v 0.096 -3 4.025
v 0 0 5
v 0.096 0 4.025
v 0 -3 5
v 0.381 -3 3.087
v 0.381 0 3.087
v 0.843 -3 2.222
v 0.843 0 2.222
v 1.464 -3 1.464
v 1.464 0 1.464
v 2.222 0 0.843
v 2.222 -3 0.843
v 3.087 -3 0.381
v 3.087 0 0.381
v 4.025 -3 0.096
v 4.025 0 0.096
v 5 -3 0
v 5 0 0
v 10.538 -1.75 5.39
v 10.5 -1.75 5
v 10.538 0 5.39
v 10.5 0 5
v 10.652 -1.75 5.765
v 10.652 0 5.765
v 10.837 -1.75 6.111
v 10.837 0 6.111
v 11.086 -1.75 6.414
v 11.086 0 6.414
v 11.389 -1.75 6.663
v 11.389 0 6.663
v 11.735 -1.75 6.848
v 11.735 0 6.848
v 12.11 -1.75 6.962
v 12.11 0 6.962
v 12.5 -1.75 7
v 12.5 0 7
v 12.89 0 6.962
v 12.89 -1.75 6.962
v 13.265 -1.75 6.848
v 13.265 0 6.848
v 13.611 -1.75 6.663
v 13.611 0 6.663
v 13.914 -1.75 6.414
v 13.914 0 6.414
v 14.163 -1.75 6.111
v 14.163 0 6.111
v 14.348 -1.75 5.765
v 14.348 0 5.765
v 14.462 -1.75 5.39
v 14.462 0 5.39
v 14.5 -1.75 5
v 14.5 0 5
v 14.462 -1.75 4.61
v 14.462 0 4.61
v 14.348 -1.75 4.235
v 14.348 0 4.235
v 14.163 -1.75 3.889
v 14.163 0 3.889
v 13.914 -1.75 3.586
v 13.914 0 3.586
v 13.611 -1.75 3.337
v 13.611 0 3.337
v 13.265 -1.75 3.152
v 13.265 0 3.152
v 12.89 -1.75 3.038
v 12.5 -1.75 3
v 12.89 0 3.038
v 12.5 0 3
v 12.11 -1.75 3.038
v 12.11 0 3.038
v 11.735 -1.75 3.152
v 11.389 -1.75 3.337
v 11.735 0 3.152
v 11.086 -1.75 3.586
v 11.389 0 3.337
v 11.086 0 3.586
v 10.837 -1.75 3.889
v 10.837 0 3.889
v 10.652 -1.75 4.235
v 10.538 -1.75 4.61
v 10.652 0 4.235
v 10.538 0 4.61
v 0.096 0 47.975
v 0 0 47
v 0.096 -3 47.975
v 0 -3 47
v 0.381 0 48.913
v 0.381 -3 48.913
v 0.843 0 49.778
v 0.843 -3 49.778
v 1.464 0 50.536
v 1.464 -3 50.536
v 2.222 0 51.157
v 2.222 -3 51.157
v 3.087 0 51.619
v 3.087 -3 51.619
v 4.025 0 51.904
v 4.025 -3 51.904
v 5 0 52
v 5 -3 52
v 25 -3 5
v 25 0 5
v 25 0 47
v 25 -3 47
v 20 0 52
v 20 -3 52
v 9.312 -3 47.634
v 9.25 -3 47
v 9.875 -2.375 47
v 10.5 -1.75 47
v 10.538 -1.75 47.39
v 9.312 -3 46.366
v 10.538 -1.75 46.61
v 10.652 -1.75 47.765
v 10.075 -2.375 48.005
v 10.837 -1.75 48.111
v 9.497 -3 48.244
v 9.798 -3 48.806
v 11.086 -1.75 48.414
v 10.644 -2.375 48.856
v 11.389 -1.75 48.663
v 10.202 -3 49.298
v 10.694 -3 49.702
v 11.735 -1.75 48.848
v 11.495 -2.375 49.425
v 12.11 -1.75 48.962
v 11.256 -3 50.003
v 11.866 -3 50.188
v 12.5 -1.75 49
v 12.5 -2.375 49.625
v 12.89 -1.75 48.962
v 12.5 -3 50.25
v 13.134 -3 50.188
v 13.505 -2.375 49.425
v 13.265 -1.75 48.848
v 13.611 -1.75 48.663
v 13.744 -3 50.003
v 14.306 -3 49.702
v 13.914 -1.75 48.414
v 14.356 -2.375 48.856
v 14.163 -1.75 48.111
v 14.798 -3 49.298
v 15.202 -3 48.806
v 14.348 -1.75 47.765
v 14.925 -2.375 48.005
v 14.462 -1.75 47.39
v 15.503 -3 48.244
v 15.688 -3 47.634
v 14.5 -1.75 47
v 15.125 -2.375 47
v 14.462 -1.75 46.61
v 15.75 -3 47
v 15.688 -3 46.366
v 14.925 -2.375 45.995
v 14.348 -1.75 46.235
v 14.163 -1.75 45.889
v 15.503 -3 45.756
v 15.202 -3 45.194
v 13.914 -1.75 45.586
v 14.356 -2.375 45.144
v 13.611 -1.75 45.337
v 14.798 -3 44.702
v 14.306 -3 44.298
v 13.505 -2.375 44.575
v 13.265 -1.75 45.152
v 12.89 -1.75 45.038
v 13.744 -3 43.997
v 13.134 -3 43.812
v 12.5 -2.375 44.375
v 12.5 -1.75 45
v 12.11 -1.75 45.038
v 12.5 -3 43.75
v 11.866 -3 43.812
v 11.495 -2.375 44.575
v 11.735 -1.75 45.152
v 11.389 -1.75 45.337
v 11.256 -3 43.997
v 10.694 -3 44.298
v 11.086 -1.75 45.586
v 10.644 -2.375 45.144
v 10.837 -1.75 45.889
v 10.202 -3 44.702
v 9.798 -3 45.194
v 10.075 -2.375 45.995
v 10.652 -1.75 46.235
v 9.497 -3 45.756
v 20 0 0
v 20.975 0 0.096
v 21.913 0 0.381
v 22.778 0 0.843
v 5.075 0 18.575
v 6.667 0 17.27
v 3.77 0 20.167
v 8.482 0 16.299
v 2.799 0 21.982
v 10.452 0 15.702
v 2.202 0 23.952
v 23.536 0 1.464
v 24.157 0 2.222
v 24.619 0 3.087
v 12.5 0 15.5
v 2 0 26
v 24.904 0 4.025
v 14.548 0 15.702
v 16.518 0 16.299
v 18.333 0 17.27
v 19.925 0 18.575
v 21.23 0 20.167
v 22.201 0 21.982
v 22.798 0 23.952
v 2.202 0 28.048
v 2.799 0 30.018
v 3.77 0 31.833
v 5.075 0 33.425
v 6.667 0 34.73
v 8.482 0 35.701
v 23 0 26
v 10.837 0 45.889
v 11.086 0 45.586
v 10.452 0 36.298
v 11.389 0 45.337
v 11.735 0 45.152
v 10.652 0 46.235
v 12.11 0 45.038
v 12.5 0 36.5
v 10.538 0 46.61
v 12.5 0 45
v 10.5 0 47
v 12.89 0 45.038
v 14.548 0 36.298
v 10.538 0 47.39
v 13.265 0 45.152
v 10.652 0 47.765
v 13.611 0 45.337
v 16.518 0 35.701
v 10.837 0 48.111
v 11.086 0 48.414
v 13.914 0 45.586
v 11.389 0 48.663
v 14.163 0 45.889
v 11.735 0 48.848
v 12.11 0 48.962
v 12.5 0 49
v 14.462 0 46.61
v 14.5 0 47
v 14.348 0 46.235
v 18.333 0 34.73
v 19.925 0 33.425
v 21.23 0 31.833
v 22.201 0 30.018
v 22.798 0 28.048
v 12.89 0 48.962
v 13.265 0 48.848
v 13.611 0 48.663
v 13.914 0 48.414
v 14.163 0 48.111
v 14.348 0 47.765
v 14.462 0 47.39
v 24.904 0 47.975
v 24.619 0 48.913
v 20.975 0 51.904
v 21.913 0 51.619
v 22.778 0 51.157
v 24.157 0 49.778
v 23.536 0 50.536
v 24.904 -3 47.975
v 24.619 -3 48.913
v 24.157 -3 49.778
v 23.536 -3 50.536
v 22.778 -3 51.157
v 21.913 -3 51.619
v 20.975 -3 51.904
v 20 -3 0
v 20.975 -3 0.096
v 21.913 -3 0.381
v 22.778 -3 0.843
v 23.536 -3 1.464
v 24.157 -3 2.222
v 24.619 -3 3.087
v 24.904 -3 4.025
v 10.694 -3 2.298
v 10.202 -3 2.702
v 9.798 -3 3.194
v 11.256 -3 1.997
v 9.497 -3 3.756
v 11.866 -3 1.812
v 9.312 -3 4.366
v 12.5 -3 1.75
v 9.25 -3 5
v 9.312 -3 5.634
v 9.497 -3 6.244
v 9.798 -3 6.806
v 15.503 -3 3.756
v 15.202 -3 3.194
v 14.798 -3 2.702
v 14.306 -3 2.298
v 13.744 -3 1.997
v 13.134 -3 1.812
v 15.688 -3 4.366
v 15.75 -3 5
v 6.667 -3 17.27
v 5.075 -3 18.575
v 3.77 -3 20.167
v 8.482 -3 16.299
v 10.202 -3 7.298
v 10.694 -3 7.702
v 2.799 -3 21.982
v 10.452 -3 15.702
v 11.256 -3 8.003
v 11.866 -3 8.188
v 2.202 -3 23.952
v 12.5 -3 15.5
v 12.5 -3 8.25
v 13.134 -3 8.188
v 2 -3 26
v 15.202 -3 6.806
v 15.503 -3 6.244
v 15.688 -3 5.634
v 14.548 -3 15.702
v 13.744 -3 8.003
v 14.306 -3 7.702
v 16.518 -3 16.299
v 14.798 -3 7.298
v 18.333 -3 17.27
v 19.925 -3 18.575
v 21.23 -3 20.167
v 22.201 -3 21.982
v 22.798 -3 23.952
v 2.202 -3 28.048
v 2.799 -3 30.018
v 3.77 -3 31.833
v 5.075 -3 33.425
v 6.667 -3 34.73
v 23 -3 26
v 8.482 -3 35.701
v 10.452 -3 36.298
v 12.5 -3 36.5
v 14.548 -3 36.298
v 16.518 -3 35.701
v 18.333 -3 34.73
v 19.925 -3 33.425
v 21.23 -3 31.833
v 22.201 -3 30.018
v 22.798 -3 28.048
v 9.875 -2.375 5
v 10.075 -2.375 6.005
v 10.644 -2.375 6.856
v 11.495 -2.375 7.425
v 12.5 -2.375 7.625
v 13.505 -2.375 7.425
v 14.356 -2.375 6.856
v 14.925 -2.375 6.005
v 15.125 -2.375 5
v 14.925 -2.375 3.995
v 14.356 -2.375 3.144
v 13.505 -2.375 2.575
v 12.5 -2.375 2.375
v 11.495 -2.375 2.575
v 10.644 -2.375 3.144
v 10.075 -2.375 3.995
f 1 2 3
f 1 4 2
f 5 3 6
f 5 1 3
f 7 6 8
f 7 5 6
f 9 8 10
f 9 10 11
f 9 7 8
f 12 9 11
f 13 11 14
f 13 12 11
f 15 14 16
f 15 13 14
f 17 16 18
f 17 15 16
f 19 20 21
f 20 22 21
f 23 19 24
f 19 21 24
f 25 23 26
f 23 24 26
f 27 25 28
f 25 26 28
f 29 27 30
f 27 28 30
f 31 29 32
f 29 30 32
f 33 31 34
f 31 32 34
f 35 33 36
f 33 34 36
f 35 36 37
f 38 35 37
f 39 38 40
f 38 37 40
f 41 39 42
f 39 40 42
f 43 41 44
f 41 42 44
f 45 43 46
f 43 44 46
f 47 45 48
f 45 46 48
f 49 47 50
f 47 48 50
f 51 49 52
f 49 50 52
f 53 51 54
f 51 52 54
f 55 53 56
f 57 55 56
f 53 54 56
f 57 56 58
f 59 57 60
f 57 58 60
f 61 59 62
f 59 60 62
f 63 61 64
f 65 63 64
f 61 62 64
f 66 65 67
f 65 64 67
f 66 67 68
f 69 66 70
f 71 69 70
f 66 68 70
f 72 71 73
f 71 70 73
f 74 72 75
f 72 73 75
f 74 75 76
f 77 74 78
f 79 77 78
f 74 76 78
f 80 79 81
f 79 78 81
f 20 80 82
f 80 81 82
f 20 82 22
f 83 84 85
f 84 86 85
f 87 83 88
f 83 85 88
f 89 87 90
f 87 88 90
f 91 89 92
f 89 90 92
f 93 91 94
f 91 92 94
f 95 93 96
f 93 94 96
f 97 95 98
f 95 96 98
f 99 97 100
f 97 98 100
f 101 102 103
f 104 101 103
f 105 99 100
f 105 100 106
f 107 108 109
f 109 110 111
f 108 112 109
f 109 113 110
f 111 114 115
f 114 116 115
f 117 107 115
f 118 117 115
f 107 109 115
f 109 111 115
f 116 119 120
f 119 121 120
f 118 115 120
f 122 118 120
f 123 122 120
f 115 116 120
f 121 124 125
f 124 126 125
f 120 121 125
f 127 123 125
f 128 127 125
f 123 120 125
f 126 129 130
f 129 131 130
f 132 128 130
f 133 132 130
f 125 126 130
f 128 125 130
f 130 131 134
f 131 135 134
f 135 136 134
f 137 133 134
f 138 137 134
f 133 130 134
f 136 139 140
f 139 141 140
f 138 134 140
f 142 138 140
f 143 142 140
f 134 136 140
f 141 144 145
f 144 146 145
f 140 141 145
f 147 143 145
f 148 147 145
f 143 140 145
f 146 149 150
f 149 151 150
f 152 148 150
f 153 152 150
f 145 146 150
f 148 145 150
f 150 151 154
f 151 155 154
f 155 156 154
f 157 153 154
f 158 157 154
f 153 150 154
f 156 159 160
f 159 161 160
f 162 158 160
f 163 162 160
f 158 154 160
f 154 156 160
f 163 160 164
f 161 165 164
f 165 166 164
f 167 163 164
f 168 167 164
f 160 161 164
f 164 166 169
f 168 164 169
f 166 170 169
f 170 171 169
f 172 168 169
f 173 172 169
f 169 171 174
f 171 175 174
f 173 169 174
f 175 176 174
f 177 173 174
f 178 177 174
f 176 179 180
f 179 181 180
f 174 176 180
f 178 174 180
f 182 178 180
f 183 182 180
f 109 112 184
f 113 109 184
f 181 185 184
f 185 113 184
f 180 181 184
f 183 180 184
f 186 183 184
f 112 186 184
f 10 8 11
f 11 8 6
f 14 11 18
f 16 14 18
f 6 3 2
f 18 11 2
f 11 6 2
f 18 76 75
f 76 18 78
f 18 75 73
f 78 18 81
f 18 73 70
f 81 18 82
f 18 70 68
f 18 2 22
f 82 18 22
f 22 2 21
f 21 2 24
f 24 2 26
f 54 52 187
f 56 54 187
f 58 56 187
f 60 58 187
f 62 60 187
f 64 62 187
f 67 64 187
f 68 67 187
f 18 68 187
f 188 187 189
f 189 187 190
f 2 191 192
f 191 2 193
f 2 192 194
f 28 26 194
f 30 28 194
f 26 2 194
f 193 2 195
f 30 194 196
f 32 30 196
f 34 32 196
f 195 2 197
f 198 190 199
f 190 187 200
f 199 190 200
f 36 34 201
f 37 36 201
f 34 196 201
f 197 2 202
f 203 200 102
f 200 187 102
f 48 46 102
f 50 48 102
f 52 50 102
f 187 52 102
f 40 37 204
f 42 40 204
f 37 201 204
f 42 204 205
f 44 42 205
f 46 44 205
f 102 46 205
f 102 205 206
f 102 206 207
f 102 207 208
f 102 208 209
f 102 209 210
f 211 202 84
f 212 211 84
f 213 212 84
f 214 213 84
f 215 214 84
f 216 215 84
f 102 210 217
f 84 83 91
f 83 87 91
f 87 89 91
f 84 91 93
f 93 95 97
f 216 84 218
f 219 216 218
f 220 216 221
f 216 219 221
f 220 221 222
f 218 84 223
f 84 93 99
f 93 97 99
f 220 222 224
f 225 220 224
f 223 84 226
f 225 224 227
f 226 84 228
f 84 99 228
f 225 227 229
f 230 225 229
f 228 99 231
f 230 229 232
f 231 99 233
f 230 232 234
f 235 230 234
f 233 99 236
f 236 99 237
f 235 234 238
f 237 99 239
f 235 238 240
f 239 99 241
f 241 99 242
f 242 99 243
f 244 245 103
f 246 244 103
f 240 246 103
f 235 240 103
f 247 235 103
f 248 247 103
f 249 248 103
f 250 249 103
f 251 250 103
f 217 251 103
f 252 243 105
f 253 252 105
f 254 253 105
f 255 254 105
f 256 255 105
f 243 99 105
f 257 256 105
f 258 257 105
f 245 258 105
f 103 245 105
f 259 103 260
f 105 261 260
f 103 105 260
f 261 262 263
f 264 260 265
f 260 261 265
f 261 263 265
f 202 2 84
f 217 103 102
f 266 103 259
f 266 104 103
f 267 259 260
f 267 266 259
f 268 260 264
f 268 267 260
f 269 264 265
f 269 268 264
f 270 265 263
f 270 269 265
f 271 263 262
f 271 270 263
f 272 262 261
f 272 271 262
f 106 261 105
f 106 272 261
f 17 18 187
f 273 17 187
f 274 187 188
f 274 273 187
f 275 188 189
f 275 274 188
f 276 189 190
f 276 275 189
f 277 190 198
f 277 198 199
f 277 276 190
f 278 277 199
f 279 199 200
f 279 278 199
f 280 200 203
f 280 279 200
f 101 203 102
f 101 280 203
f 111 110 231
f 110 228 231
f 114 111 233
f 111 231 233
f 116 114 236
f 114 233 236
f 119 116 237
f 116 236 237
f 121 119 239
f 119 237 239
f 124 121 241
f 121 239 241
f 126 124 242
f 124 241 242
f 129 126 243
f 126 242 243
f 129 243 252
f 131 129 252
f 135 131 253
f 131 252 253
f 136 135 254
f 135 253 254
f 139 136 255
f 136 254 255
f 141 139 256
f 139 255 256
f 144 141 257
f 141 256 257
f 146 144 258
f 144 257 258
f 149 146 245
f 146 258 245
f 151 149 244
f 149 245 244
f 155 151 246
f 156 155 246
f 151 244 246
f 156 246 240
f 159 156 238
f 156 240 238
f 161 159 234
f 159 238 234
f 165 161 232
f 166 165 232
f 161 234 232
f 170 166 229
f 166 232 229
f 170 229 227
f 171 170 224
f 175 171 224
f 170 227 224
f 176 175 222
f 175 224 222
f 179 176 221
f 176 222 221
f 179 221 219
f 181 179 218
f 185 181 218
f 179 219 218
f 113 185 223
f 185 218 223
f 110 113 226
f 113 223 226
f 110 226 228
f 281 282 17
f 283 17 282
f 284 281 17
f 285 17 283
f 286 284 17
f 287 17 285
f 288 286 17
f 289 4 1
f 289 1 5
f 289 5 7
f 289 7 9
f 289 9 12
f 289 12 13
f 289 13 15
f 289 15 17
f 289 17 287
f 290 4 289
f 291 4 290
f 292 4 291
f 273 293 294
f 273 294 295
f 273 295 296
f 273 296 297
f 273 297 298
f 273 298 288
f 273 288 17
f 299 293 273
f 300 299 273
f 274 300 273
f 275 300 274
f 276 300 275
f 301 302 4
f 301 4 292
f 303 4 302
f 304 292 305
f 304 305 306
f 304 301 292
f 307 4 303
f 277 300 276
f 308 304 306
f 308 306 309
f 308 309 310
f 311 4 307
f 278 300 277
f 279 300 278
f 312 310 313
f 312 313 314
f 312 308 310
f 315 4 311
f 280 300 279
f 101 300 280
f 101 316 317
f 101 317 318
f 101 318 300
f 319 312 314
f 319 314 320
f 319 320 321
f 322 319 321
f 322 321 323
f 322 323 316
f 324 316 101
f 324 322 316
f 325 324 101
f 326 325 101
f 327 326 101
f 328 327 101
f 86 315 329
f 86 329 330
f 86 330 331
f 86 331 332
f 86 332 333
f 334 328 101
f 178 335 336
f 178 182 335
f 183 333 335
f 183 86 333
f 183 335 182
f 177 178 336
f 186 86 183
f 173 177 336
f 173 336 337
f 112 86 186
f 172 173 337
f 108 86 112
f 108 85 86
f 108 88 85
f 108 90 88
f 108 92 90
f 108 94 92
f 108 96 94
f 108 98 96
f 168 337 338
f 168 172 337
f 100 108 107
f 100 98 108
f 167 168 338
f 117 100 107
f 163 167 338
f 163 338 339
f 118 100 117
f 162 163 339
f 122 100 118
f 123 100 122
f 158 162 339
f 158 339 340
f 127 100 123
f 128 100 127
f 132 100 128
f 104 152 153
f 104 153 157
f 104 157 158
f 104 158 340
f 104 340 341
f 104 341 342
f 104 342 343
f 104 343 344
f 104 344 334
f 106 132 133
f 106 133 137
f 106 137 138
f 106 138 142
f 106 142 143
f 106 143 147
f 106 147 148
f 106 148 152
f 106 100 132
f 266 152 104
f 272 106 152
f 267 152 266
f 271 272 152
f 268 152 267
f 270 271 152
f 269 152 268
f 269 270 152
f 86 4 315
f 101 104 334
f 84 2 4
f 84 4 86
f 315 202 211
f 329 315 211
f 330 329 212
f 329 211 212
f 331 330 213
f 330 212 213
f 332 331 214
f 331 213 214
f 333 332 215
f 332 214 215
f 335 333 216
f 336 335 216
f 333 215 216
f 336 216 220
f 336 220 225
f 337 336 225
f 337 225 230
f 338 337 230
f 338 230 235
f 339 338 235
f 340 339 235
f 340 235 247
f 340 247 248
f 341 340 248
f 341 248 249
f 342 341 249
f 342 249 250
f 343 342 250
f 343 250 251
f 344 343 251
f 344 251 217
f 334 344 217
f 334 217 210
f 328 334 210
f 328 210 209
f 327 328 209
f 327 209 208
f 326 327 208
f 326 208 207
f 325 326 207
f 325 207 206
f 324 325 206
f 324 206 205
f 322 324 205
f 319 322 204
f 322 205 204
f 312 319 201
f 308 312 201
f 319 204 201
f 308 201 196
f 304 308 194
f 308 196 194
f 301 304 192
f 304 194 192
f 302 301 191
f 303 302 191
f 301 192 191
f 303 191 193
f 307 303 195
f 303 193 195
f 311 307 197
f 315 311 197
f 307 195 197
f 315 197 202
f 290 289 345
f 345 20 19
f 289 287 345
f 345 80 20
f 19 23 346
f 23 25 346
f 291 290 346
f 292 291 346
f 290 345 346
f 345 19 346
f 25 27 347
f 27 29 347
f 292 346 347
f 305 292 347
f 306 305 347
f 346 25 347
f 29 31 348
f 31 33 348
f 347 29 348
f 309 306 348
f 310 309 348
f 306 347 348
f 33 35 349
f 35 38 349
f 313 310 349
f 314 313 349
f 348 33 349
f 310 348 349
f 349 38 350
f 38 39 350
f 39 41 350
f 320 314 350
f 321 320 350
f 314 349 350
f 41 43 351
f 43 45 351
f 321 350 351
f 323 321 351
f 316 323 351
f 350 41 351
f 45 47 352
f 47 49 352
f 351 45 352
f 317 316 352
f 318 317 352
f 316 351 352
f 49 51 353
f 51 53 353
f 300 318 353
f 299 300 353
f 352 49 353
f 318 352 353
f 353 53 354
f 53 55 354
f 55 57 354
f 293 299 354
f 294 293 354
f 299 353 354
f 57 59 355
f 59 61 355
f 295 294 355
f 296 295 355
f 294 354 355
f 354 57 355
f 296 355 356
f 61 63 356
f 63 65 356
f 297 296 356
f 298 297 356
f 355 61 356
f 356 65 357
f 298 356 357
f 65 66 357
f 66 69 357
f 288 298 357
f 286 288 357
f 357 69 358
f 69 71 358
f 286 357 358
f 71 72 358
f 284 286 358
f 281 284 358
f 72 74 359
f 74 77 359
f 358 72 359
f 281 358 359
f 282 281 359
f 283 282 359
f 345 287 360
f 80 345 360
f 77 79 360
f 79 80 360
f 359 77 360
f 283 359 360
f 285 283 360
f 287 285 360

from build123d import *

# Parameters (mm, degrees)
F0_W           = 25
F0_H           = 52
F1_DEPTH       = 3
F2_R           = 5
F4_D           = 4
F4_CSINK_D     = 6.5
F4_CSINK_ANGLE = 90
F5_D           = 21


with BuildPart() as f1:
    # F0 (on Front) → F1 (new body)
    with BuildSketch(Plane.XZ):
        with Locations((12.5, 26)):
            Rectangle(F0_W, F0_H)
    extrude(amount=F1_DEPTH)

    # F2
    f2_edges = [f1.edges().sort_by_distance(p)[0] for p in [
        (25, -1.5, 52),
        (0, -1.5, 52),
        (0, -1.5, 0),
        (25, -1.5, 0),
    ]]
    fillet(f2_edges, radius=F2_R)

    # F4 (through all)
    with Locations(Plane.XZ.offset(3)):
        with Locations((12.5, 47), (12.5, 5)):
            CounterSinkHole(F4_D / 2, F4_CSINK_D / 2, counter_sink_angle=F4_CSINK_ANGLE)

    # F5 (through all)
    with Locations(Plane.XZ.offset(3)):
        with Locations((12.5, 26)):
            Hole(F5_D / 2)


solid = f1.part
